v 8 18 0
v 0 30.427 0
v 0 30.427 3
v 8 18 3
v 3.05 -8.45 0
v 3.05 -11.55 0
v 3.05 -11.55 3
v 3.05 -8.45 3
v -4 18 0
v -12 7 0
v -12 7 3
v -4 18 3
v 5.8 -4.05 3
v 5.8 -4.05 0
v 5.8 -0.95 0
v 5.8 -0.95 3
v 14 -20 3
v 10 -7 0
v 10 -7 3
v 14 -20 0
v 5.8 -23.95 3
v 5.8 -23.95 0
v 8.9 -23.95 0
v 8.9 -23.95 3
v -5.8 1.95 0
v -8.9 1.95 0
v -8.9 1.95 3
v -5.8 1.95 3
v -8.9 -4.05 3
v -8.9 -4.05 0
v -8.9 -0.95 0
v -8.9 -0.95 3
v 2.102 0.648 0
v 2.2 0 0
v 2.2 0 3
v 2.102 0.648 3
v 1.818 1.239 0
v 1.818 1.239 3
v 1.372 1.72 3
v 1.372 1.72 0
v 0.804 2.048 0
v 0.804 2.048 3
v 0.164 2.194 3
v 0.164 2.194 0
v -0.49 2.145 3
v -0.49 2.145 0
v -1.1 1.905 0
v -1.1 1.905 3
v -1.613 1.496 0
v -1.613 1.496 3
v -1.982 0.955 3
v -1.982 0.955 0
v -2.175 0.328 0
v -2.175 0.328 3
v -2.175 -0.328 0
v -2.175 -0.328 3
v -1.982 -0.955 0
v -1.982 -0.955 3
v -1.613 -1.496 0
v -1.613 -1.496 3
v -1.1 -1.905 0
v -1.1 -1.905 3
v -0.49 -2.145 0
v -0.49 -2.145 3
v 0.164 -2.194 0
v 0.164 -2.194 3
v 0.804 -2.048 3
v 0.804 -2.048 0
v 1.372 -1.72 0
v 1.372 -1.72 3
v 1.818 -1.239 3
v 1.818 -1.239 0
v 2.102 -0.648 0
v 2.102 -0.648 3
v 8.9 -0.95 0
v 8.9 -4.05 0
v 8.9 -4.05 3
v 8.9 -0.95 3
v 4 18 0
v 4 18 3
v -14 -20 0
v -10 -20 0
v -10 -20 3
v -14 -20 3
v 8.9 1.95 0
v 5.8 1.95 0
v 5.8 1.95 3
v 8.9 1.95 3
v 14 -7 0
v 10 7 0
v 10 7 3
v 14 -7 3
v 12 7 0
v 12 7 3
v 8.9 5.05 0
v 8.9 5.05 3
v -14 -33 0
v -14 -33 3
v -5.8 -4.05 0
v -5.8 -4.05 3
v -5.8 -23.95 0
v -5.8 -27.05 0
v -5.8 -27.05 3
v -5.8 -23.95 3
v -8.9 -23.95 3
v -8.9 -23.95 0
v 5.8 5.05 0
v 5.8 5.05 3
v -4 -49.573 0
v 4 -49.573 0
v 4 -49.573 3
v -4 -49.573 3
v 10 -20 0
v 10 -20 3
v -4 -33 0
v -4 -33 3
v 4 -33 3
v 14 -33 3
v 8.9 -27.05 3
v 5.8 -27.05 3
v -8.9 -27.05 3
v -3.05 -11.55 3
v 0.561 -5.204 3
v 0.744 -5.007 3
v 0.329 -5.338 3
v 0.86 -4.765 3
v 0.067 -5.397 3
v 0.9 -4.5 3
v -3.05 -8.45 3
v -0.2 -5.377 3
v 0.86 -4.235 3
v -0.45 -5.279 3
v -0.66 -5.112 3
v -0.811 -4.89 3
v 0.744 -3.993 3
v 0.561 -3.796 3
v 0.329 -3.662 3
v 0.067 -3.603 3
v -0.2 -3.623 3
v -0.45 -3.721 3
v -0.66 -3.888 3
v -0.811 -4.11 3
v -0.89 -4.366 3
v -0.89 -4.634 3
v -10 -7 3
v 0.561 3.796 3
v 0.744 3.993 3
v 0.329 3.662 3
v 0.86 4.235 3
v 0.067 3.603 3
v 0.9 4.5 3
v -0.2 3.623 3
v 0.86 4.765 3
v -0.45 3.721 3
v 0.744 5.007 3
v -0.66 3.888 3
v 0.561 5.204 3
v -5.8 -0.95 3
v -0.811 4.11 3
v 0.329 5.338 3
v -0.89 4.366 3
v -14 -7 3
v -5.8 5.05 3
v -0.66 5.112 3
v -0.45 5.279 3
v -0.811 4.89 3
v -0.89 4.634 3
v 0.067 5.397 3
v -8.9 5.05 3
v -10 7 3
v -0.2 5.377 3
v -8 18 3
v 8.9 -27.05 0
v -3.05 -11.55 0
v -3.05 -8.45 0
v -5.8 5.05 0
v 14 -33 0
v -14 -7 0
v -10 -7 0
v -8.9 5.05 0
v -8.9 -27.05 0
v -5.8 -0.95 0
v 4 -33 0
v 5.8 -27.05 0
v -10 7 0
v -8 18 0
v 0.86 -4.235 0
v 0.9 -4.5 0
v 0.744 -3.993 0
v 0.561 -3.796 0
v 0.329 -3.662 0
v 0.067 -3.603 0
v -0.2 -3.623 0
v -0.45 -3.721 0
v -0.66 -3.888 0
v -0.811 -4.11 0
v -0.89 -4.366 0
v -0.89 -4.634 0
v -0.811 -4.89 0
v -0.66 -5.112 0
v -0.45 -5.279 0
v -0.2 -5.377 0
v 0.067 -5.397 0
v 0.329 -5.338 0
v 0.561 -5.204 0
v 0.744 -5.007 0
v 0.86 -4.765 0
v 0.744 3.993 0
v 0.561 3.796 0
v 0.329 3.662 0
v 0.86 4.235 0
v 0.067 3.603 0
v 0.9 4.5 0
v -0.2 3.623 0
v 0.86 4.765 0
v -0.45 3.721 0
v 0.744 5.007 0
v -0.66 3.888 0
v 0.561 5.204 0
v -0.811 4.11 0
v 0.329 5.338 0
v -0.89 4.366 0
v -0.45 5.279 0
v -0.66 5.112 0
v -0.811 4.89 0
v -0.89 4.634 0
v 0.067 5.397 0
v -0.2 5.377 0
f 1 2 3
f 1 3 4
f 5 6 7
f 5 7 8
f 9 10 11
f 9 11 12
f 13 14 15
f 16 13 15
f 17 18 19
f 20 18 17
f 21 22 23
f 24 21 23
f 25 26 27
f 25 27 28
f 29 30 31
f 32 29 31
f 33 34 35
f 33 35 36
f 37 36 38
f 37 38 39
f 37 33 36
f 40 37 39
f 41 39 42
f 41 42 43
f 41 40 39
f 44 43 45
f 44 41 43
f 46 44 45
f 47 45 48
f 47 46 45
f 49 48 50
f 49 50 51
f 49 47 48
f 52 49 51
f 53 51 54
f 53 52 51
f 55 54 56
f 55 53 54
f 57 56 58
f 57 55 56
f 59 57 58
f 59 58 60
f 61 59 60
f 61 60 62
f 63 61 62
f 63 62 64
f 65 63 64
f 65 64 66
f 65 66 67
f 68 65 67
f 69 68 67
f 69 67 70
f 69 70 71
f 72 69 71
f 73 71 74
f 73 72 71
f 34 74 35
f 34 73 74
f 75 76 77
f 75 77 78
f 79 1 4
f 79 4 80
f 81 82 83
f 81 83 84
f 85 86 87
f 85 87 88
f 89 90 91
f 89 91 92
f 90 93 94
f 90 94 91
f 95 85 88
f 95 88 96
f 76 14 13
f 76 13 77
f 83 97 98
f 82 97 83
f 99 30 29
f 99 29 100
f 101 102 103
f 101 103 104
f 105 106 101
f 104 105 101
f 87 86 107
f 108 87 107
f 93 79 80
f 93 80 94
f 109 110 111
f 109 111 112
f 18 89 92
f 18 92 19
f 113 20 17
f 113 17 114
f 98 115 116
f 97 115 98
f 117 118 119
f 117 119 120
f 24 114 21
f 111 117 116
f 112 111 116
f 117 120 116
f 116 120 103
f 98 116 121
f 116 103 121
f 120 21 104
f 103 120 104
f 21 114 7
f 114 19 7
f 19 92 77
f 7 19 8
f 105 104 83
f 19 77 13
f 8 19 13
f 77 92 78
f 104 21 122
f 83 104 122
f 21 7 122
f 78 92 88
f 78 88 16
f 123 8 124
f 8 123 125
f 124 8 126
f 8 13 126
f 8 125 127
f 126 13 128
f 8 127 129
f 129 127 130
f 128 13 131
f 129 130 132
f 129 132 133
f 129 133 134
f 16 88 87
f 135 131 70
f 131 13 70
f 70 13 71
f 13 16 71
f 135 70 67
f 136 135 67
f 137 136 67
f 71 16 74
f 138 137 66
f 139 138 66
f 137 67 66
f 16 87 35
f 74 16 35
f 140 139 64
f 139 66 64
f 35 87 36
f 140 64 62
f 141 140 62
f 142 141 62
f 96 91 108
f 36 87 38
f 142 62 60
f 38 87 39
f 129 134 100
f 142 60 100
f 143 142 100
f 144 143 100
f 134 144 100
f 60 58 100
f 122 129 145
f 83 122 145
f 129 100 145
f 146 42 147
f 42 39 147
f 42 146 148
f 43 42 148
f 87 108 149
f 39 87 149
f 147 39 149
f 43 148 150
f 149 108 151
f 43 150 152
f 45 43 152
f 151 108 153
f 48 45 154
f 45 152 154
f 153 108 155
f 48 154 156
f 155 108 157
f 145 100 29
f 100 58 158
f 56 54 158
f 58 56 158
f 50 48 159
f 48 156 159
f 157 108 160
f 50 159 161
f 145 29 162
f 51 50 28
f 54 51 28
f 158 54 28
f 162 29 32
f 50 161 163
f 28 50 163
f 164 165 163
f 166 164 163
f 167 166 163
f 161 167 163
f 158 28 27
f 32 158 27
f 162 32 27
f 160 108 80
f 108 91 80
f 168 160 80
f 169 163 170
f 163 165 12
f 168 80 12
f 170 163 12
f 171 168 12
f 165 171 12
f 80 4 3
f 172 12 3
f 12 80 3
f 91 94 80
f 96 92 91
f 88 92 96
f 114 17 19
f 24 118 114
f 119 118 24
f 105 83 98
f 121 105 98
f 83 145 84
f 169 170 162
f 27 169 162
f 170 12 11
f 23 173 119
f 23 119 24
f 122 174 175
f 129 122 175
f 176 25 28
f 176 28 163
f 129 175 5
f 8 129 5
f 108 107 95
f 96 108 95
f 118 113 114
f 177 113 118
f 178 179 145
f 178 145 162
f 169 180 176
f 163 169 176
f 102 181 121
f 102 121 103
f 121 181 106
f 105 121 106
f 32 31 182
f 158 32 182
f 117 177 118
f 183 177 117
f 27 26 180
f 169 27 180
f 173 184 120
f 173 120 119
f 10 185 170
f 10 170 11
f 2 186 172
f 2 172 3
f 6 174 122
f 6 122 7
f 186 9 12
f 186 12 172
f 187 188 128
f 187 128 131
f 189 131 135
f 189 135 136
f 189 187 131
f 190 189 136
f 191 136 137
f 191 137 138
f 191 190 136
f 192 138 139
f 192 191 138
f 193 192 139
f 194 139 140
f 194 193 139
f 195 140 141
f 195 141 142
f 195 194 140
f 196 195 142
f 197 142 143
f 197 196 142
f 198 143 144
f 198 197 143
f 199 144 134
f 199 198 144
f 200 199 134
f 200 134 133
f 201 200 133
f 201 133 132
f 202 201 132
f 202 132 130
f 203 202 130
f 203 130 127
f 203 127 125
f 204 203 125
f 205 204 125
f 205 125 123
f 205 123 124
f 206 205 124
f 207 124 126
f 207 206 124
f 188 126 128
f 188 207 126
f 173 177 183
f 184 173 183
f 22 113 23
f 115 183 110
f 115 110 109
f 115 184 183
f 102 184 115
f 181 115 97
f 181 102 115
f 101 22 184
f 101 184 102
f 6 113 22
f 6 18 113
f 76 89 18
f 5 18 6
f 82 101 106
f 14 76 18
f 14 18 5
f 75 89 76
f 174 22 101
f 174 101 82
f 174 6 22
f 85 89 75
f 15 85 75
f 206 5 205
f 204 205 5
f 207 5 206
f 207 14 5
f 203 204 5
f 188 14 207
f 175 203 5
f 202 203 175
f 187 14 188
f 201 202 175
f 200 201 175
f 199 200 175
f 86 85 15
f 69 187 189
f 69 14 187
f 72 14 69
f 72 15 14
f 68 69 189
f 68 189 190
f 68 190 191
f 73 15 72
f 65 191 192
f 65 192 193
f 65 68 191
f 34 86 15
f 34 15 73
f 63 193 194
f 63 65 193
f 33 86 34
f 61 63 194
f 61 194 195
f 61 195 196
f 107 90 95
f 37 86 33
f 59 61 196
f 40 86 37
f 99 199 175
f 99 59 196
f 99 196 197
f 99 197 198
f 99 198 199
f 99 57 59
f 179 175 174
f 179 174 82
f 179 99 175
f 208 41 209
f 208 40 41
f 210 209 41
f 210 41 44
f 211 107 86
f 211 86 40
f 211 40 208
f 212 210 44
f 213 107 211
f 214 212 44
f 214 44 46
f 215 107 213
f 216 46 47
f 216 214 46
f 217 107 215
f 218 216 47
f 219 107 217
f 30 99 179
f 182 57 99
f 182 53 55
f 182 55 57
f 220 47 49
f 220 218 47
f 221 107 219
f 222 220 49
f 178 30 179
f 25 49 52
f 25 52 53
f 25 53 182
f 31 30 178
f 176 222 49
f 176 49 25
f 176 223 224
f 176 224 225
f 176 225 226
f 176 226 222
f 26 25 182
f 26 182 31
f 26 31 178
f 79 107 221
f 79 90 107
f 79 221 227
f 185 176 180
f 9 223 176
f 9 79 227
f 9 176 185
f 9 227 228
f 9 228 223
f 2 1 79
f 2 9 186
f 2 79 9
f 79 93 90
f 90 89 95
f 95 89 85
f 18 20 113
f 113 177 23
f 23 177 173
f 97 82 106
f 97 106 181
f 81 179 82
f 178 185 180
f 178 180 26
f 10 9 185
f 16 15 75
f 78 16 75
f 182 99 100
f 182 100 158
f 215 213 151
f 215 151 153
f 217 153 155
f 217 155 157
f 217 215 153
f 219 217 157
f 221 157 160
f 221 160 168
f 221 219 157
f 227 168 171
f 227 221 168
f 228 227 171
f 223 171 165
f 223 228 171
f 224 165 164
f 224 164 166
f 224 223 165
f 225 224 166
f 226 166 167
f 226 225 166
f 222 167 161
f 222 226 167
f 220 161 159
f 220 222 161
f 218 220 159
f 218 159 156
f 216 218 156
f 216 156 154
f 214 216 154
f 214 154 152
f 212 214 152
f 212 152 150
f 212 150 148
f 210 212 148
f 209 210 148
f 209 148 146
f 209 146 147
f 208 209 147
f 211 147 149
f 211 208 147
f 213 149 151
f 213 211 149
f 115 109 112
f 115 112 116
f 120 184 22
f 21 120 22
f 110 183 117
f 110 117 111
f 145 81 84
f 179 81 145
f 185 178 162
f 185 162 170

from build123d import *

# Parameters (mm, degrees)
PROFILE_LASER_PROFILE_3MM_R   = 2.2
PROFILE_LASER_PROFILE_3MM_R_2 = 0.9
PROFILE_LASER_PROFILE_3MM_W   = 3.1
PROFILE_LASER_PROFILE_3MM_H   = 3.1
PROFILE_LASER_PROFILE_3MM_W_2 = 6.1
LASER_PROFILE_3MM_DEPTH       = 3


with BuildPart() as part:
    # Profile_Laser_profile_3mm → Laser_profile_3mm (new body)
    with BuildSketch(Plane.XY):
        Polygon((0, 30.427227289), (8, 18), (4, 18), (12, 7), (10, 7), (14, -7), (10, -7), (14, -20), (10, -20), (14, -33), (4, -33), (4, -49.572772711), (-4, -49.572772711), (-4, -33), (-14, -33), (-10, -20), (-14, -20), (-10, -7), (-14, -7), (-10, 7), (-12, 7), (-4, 18), (-8, 18), align=None)
        Circle(PROFILE_LASER_PROFILE_3MM_R, mode=Mode.SUBTRACT)
        with Locations((0, -4.5)):
            Circle(PROFILE_LASER_PROFILE_3MM_R_2, mode=Mode.SUBTRACT)
        with Locations((0, 4.5)):
            Circle(PROFILE_LASER_PROFILE_3MM_R_2, mode=Mode.SUBTRACT)
        with Locations((-7.35, 3.5)):
            Rectangle(PROFILE_LASER_PROFILE_3MM_W, PROFILE_LASER_PROFILE_3MM_H, mode=Mode.SUBTRACT)
        with Locations((-7.35, -2.5)):
            Rectangle(PROFILE_LASER_PROFILE_3MM_W, PROFILE_LASER_PROFILE_3MM_H, mode=Mode.SUBTRACT)
        with Locations((-7.35, -25.5)):
            Rectangle(PROFILE_LASER_PROFILE_3MM_W, PROFILE_LASER_PROFILE_3MM_H, mode=Mode.SUBTRACT)
        with Locations((7.35, 3.5)):
            Rectangle(PROFILE_LASER_PROFILE_3MM_W, PROFILE_LASER_PROFILE_3MM_H, mode=Mode.SUBTRACT)
        with Locations((7.35, -2.5)):
            Rectangle(PROFILE_LASER_PROFILE_3MM_W, PROFILE_LASER_PROFILE_3MM_H, mode=Mode.SUBTRACT)
        with Locations((7.35, -25.5)):
            Rectangle(PROFILE_LASER_PROFILE_3MM_W, PROFILE_LASER_PROFILE_3MM_H, mode=Mode.SUBTRACT)
        with Locations((0, -10)):
            Rectangle(PROFILE_LASER_PROFILE_3MM_W_2, PROFILE_LASER_PROFILE_3MM_H, mode=Mode.SUBTRACT)
    extrude(amount=LASER_PROFILE_3MM_DEPTH)


solid = part.part
